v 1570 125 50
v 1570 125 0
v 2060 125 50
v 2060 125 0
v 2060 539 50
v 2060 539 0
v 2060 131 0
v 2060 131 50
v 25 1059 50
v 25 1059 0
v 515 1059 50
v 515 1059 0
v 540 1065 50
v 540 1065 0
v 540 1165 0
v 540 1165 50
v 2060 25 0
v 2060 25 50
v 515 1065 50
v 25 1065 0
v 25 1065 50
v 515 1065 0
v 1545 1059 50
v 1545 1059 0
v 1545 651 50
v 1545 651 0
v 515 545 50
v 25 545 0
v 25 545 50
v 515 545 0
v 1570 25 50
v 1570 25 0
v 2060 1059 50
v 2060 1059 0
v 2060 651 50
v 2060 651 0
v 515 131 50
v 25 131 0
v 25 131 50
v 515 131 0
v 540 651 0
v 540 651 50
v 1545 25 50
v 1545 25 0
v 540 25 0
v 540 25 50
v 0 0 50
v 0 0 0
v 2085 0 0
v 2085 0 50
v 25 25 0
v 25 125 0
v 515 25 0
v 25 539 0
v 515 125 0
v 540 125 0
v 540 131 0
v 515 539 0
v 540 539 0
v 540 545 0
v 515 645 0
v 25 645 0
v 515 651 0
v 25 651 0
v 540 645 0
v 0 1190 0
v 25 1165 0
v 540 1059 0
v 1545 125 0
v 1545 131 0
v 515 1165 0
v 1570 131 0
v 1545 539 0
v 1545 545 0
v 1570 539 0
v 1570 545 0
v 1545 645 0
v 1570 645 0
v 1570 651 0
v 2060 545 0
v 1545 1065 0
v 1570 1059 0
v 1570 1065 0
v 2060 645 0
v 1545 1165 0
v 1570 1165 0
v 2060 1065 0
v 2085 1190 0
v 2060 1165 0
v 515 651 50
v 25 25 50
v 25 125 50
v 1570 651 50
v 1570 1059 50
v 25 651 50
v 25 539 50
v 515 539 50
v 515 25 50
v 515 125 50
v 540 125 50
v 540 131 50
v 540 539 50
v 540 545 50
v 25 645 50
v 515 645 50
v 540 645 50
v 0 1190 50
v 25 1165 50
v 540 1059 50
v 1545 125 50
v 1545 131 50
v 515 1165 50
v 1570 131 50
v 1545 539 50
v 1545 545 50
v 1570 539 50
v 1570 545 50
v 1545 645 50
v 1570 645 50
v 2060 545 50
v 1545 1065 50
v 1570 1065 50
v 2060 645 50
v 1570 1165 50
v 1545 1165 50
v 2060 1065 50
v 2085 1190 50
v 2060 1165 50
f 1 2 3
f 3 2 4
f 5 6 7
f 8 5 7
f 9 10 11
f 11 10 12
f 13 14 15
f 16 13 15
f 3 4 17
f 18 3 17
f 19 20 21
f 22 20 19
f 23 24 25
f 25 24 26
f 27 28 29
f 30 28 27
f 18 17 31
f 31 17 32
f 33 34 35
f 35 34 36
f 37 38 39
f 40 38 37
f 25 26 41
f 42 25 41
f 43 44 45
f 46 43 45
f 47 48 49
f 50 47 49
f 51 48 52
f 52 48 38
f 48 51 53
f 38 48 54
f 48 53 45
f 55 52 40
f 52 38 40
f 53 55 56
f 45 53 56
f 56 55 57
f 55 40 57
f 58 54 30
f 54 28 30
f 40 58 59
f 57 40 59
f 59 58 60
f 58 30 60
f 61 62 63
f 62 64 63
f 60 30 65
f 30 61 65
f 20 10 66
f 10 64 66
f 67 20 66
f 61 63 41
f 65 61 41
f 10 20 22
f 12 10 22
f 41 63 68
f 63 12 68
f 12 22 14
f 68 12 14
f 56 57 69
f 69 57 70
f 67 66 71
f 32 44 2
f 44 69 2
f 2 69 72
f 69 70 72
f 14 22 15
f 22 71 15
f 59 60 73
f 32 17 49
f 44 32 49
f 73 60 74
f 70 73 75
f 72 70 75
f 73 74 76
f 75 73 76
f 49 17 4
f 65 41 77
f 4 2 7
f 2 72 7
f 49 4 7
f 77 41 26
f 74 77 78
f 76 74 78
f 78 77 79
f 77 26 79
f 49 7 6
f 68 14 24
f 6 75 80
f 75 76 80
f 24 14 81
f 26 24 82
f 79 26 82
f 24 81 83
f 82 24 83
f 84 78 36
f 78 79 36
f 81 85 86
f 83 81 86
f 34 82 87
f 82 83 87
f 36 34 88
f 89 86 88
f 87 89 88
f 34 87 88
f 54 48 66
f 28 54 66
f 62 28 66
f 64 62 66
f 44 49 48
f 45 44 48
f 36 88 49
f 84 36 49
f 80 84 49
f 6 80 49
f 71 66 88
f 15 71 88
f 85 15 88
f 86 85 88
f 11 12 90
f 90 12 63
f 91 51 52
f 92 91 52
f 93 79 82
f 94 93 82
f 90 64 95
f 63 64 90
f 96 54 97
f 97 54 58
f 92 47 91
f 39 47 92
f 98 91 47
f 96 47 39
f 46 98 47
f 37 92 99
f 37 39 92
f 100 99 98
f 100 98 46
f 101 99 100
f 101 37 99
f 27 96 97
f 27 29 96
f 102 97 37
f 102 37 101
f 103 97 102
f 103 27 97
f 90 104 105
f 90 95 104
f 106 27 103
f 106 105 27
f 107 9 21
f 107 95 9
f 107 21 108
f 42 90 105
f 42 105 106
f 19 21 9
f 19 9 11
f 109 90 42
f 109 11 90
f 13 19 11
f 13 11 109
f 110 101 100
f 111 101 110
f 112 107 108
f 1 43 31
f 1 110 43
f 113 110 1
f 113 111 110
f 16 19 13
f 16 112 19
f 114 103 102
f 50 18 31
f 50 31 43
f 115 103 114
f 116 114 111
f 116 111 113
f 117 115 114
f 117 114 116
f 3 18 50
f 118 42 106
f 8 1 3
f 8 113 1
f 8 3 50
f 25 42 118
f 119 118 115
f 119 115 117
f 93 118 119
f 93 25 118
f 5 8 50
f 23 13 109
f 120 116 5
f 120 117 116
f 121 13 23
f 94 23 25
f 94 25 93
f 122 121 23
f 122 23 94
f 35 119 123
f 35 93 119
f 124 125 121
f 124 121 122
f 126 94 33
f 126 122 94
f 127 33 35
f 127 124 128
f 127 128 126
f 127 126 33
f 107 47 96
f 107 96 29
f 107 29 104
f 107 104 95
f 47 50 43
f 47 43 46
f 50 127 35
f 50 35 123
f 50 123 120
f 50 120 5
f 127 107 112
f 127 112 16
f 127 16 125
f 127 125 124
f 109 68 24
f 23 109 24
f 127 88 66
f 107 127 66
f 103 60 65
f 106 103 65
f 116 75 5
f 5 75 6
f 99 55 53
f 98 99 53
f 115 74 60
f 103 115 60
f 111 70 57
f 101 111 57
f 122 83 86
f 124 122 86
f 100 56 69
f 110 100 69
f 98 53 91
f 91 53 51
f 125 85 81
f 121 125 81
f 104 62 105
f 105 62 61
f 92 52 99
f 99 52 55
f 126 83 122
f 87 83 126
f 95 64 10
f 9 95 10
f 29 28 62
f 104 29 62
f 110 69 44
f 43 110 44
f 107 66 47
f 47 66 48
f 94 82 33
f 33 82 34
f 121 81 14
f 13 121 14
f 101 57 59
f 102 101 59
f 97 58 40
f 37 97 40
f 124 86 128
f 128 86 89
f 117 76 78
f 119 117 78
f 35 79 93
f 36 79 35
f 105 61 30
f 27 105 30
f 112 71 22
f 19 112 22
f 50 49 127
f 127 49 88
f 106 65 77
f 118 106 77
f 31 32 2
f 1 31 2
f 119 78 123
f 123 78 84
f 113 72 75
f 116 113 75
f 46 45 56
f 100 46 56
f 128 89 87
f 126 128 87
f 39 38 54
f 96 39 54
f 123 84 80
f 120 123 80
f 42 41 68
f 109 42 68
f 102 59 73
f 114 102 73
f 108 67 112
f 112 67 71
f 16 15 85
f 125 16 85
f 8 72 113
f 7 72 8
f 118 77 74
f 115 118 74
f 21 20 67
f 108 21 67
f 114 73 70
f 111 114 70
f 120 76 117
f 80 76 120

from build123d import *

# Parameters (mm, degrees)
F0_W     = 490
F0_H     = 6
F0_W_2   = 25
F1_DEPTH = 50


# Not quite as in the source:
# - a feature names something its author has since deleted; it is built from what else it names
# - the program builds the solid bodies; features that only make, move or delete a surface that nothing else refers to are left out


with BuildPart() as f1:
    # F0 (on Top) → F1 (new body)
    with BuildSketch(Plane.XY):
        Polygon((0, 1190), (0, 0), (515, 0), (540, 0), (540, 25), (540, 125), (540, 131), (540, 539), (540, 545), (540, 645), (540, 651), (540, 1059), (540, 1065), (540, 1165), (540, 1190), (515, 1190), align=None)
        Polygon((25, 1065), (25, 1165), (515, 1165), (515, 1065), (515, 1059), (515, 651), (515, 645), (515, 545), (515, 539), (515, 131), (515, 125), (515, 25), (25, 25), (25, 125), (25, 131), (25, 539), (25, 545), (25, 645), (25, 651), (25, 1059), align=None, mode=Mode.SUBTRACT)
        Polygon((540, 25), (540, 0), (1030, 0), (1055, 0), (1545, 0), (1570, 0), (1570, 25), (1570, 125), (1570, 131), (1570, 539), (1570, 545), (1570, 645), (1570, 651), (1570, 1059), (1570, 1065), (1570, 1165), (1570, 1190), (1545, 1190), (1055, 1190), (1030, 1190), (540, 1190), (540, 1165), (1030, 1165), (1055, 1165), (1545, 1165), (1545, 1065), (1545, 1059), (1545, 651), (1545, 645), (1545, 545), (1545, 539), (1545, 131), (1545, 125), (1545, 25), (1055, 25), (1030, 25), align=None)
        Polygon((1570, 25), (1570, 0), (2085, 0), (2085, 1190), (1570, 1190), (1570, 1165), (2060, 1165), (2060, 1065), (2060, 1059), (2060, 651), (2060, 645), (2060, 545), (2060, 539), (2060, 131), (2060, 125), (2060, 25), align=None)
        with Locations((270, 542)):
            Rectangle(F0_W, F0_H)
        with Locations((270, 128)):
            Rectangle(F0_W, F0_H)
        with Locations((270, 648)):
            Rectangle(F0_W, F0_H)
        with Locations((270, 1062)):
            Rectangle(F0_W, F0_H)
        with Locations((785, 648)):
            Rectangle(F0_W, F0_H)
        with Locations((1300, 648)):
            Rectangle(F0_W, F0_H)
        with Locations((1300, 542)):
            Rectangle(F0_W, F0_H)
        with Locations((785, 542)):
            Rectangle(F0_W, F0_H)
        with Locations((1815, 542)):
            Rectangle(F0_W, F0_H)
        with Locations((1815, 648)):
            Rectangle(F0_W, F0_H)
        with Locations((1815, 1062)):
            Rectangle(F0_W, F0_H)
        with Locations((1300, 1062)):
            Rectangle(F0_W, F0_H)
        with Locations((785, 1062)):
            Rectangle(F0_W, F0_H)
        with Locations((1815, 128)):
            Rectangle(F0_W, F0_H)
        with Locations((785, 128)):
            Rectangle(F0_W, F0_H)
        with Locations((1300, 128)):
            Rectangle(F0_W, F0_H)
        with Locations((1042.5, 128)):
            Rectangle(F0_W_2, F0_H)
        with Locations((1042.5, 542)):
            Rectangle(F0_W_2, F0_H)
        with Locations((1042.5, 1062)):
            Rectangle(F0_W_2, F0_H)
        with Locations((1042.5, 648)):
            Rectangle(F0_W_2, F0_H)
    extrude(amount=F1_DEPTH)


solid = f1.part
